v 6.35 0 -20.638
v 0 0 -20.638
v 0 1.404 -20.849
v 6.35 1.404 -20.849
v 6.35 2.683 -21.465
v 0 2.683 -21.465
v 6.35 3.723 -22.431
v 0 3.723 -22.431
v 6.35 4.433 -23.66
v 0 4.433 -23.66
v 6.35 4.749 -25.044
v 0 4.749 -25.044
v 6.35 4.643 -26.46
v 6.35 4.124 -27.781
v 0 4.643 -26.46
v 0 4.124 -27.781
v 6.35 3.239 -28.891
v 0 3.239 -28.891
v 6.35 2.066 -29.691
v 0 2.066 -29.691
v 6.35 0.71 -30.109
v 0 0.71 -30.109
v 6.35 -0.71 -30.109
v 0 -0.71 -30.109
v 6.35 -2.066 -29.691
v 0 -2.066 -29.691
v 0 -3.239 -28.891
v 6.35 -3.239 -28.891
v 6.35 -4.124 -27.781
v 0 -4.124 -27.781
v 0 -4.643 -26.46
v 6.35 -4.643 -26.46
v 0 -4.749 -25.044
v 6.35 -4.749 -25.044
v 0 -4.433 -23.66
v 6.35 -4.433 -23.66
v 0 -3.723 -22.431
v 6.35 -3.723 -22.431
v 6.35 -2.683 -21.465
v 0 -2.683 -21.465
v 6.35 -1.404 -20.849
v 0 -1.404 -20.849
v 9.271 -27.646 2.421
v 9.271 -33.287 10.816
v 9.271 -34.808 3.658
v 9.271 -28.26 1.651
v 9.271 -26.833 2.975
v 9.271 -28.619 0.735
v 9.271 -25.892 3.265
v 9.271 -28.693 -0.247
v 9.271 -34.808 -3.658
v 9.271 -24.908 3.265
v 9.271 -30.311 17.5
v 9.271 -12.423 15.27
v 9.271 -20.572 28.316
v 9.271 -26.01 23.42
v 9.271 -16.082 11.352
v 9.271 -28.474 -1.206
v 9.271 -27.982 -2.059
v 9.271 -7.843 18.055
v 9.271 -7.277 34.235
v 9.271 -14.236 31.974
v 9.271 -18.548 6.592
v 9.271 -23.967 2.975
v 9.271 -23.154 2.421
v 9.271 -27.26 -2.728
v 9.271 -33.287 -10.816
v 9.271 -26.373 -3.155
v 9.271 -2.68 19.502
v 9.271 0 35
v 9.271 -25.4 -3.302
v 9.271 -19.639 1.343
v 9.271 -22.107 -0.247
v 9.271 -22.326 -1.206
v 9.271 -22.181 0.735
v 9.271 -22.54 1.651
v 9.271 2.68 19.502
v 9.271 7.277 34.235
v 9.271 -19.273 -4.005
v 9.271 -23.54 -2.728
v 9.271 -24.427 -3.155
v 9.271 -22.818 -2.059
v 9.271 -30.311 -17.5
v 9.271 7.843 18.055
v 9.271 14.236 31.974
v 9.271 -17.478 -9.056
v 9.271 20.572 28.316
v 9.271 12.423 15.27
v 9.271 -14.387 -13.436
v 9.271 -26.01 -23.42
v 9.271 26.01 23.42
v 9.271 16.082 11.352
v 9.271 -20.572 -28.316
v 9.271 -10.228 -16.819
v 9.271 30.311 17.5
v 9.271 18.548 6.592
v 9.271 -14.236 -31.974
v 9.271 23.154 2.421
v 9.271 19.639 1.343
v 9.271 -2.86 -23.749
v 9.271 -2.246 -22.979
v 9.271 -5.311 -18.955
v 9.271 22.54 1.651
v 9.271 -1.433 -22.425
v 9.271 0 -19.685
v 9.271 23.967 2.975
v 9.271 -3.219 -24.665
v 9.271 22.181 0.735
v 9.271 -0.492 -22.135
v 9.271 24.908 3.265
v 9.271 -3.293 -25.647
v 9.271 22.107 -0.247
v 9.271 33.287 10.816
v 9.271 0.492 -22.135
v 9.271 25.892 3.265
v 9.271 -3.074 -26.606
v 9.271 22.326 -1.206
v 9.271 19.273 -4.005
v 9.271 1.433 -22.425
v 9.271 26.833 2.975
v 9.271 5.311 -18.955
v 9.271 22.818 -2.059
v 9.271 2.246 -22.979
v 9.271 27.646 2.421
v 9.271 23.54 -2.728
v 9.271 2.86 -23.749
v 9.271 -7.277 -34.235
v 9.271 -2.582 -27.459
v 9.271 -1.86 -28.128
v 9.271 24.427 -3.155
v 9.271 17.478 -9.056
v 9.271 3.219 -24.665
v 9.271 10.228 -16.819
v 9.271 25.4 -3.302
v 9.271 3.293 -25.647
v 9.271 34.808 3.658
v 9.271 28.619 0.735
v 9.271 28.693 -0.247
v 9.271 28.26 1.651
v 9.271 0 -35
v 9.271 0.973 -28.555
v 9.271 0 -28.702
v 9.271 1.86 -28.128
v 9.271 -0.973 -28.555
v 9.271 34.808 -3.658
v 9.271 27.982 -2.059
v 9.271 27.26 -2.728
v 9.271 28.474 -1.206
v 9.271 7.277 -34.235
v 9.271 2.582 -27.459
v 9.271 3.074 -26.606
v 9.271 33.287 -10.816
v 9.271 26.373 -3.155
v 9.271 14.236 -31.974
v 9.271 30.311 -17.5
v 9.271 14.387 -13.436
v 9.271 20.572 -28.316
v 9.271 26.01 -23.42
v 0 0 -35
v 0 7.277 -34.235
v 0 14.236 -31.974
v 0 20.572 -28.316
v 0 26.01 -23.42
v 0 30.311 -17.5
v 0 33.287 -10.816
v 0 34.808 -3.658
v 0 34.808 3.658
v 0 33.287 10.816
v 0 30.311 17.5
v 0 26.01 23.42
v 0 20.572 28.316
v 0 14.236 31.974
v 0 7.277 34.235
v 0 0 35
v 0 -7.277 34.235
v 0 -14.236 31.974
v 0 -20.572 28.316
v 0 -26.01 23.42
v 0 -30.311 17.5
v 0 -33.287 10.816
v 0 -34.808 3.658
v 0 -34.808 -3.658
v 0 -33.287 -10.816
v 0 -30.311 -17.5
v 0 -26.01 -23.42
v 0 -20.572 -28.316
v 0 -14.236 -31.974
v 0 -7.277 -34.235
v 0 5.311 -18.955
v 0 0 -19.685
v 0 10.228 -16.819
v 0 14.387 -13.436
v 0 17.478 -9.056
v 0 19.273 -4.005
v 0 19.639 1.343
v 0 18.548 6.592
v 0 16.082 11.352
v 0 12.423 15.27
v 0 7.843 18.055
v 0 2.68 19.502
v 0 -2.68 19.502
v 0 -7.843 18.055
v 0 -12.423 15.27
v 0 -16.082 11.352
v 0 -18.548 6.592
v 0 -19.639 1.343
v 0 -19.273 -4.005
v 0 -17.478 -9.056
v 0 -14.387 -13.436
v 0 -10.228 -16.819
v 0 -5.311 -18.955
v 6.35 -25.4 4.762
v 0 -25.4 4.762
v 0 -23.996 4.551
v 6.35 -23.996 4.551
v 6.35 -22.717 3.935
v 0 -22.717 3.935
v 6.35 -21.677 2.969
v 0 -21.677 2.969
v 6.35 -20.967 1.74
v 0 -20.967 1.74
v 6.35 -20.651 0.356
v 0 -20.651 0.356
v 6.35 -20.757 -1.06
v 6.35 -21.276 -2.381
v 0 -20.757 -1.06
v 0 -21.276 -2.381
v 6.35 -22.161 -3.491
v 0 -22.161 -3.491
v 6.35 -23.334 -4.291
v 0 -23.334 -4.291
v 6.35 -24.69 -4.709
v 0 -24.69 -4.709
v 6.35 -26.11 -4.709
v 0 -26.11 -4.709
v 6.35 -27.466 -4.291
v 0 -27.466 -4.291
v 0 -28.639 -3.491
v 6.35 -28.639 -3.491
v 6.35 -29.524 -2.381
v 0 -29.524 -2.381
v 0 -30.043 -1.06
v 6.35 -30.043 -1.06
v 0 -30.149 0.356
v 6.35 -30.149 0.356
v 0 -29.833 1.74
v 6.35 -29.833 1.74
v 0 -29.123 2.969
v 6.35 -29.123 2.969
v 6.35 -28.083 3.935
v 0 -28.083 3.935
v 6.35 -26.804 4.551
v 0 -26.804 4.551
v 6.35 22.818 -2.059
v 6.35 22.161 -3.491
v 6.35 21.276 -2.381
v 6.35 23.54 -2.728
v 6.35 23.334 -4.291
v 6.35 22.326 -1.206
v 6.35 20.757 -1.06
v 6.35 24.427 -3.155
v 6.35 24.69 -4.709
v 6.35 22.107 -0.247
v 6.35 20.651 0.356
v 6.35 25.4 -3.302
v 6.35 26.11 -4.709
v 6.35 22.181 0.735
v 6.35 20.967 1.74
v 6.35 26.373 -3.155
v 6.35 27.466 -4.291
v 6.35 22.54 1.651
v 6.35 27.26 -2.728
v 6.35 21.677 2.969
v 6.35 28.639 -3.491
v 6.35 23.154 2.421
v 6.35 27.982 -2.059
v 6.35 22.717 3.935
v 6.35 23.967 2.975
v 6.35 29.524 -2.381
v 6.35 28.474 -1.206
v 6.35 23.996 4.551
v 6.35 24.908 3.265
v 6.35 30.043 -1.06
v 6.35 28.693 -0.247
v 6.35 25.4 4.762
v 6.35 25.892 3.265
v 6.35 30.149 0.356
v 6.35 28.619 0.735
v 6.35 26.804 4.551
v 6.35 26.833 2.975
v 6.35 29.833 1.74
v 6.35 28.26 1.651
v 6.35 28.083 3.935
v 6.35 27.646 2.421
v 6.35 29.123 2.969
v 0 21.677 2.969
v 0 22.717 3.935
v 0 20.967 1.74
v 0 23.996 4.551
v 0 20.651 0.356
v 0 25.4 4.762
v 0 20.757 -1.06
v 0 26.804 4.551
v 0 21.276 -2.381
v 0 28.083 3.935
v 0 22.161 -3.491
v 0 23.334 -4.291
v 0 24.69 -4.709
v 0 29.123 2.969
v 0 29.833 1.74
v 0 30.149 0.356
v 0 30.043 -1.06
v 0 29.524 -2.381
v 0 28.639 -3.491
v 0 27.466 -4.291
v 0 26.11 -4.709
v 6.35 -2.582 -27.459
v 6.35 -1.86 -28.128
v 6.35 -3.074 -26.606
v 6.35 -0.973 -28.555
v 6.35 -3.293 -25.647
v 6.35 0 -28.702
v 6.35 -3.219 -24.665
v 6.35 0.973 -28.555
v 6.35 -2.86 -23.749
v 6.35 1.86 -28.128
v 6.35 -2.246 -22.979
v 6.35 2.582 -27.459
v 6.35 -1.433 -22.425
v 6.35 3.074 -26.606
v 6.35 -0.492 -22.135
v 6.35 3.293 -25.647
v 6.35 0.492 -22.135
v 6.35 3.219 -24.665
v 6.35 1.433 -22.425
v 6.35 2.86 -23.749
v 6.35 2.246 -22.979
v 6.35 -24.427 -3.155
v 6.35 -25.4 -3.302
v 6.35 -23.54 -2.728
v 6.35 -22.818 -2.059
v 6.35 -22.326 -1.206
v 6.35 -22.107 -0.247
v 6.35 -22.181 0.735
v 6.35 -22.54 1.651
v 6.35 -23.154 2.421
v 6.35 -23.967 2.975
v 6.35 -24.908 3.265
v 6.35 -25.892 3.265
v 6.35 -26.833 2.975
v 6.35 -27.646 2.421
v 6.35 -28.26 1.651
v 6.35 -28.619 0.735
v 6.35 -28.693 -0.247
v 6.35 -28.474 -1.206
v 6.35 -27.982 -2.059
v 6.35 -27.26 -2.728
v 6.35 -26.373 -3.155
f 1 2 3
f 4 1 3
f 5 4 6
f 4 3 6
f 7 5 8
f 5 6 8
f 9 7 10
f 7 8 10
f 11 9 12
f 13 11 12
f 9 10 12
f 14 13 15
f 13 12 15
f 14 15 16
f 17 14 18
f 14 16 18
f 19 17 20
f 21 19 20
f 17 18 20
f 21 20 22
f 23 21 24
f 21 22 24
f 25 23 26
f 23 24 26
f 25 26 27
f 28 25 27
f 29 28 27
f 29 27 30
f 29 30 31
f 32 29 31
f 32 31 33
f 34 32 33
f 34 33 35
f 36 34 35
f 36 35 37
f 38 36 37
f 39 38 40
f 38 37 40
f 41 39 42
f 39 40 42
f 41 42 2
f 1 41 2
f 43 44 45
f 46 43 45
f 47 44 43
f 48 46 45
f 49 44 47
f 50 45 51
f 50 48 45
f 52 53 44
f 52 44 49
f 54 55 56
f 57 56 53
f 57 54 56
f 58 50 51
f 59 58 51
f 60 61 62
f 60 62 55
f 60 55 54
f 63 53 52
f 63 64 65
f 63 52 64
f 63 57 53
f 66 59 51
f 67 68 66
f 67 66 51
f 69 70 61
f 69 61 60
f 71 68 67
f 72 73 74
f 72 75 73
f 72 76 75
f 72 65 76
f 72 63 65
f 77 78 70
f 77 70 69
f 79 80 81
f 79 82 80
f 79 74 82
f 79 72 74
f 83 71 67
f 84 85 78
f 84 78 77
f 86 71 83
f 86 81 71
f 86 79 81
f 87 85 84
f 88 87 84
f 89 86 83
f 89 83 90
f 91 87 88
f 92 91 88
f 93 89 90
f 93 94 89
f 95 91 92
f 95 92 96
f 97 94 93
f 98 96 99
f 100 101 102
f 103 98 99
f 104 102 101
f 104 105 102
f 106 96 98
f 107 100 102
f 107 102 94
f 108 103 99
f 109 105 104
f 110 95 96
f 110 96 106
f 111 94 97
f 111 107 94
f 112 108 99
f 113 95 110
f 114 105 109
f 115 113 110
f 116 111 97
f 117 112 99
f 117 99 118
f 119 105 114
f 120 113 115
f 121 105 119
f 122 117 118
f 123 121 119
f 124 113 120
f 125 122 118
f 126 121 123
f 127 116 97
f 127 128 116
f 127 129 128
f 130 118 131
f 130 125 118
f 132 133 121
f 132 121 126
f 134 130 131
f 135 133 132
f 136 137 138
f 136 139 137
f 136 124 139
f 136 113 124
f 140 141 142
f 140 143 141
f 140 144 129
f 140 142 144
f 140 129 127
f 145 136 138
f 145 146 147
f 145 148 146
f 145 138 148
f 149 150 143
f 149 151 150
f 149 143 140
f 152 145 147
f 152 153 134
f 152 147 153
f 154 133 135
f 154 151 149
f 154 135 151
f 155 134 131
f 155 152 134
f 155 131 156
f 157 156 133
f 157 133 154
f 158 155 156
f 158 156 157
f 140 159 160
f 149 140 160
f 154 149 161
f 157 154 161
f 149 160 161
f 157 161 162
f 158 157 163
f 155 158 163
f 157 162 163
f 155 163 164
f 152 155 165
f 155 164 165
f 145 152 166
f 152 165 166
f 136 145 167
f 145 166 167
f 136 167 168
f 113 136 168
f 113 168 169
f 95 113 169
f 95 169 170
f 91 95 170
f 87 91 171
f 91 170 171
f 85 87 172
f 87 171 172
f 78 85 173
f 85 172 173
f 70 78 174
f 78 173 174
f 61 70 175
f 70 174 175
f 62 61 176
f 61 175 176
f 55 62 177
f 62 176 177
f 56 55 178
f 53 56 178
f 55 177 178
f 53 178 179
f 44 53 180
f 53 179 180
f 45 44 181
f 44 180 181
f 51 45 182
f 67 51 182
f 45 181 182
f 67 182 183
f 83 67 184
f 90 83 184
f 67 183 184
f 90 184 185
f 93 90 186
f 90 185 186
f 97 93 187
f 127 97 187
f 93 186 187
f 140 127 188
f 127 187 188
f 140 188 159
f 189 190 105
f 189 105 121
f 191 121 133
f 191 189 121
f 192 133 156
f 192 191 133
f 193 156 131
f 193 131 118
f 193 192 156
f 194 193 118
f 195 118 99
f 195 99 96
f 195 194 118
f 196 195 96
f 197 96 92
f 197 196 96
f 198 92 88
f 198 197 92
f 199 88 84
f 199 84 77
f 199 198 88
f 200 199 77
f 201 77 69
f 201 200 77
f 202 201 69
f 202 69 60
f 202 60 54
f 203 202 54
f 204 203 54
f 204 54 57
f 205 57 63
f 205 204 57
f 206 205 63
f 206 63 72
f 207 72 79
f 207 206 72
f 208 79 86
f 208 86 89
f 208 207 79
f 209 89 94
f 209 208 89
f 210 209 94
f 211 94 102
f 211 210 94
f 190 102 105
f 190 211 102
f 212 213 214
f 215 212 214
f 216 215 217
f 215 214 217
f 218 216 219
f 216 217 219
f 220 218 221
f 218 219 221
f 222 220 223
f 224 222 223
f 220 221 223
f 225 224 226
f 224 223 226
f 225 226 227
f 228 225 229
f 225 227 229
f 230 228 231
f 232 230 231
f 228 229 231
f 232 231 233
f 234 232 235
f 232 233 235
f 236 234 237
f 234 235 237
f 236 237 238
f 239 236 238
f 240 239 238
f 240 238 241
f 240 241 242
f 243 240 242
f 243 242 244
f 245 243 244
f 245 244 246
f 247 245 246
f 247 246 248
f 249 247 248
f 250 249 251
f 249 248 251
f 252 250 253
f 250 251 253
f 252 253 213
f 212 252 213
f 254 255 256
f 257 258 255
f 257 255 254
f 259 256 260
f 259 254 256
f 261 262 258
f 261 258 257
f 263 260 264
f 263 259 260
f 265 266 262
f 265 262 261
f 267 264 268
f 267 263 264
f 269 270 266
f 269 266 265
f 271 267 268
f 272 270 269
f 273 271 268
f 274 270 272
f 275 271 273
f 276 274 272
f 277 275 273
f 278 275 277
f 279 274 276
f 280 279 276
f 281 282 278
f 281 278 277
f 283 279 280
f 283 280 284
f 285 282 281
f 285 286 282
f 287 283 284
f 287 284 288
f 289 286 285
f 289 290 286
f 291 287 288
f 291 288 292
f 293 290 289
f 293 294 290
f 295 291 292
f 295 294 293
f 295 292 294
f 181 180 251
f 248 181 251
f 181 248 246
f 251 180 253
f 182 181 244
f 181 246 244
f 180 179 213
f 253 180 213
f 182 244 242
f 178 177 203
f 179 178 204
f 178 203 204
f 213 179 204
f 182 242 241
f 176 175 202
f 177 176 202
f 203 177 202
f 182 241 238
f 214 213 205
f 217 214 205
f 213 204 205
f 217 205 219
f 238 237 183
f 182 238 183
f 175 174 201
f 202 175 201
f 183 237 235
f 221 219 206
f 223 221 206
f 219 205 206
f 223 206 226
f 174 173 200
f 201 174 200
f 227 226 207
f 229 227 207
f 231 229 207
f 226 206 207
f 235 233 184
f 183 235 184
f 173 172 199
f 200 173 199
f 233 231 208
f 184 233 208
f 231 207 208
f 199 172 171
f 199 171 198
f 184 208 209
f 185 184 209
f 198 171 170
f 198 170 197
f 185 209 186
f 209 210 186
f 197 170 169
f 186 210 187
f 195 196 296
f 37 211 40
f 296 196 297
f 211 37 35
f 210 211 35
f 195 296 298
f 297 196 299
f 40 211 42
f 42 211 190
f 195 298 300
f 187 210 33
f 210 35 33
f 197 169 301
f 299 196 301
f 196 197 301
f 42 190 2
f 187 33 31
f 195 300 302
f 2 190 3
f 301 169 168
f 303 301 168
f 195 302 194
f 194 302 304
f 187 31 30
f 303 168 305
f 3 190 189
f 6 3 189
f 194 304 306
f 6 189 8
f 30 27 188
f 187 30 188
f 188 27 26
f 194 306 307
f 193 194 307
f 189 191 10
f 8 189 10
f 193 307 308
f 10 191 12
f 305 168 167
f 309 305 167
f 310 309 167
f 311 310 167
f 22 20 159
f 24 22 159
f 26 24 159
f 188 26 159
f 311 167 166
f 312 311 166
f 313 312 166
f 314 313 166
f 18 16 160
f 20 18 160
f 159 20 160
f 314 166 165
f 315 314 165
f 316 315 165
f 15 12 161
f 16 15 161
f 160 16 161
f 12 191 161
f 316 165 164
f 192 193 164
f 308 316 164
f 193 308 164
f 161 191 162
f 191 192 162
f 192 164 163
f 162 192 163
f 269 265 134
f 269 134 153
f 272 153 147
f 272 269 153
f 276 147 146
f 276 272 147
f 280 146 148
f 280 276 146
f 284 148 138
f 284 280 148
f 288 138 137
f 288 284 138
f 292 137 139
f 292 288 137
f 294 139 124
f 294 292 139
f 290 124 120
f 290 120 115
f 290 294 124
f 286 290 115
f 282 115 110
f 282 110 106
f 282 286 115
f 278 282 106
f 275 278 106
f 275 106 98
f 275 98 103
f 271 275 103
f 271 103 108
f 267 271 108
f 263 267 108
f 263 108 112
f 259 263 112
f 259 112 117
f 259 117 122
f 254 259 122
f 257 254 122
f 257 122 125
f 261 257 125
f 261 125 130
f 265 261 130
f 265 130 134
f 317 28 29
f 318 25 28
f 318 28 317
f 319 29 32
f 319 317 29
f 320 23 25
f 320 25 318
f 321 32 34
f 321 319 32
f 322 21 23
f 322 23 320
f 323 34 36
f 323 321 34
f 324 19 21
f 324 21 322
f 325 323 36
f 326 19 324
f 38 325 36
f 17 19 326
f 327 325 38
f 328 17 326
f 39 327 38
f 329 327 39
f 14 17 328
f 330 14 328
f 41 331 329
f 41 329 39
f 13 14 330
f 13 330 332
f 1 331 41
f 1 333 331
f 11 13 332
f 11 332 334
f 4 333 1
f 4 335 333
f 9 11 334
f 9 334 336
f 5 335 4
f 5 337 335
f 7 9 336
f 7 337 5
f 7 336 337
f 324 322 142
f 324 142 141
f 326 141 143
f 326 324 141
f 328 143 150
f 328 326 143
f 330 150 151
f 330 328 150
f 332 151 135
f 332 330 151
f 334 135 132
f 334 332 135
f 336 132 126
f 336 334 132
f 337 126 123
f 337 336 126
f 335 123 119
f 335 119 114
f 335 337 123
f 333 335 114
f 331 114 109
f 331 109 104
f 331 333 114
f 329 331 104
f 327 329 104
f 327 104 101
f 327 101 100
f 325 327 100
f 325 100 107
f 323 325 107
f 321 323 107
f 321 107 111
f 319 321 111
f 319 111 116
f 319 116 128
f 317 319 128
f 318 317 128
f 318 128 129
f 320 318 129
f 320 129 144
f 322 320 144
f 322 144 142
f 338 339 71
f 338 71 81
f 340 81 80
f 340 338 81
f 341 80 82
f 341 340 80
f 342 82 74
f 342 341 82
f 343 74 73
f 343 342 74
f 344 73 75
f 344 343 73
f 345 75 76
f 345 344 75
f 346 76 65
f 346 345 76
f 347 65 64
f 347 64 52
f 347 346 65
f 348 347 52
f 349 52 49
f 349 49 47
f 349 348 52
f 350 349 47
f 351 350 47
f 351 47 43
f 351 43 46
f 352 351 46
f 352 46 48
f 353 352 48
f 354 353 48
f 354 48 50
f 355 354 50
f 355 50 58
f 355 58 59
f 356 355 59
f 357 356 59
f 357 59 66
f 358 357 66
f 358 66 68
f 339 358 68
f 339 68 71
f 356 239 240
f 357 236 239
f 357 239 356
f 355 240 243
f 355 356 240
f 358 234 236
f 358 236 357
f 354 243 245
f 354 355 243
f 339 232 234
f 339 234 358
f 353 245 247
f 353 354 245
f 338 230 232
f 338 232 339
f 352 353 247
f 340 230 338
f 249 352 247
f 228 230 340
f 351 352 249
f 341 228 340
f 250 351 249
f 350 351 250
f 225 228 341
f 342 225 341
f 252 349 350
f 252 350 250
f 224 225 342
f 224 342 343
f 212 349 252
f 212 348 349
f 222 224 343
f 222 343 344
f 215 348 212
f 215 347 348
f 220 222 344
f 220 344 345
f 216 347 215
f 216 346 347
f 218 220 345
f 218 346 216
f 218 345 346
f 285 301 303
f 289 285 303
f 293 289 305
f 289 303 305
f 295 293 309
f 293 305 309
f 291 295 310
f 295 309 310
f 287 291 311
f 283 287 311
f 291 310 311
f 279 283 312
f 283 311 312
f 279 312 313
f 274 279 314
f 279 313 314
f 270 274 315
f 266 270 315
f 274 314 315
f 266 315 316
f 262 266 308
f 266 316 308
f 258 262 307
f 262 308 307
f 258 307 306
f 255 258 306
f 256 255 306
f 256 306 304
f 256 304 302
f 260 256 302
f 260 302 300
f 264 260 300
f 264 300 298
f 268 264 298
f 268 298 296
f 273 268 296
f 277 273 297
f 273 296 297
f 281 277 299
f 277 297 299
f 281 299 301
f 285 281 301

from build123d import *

# Parameters (mm, degrees)
SKETCH1_R           = 35
SKETCH1_R_2         = 19.685
SKETCH1_R_3         = 3.302
BOSS_EXTRUDE1_DEPTH = 9.271
SKETCH2_R           = 4.7625
CUT_EXTRUDE1_DEPTH  = 6.35


with BuildPart() as part:
    # Sketch1 → Boss-Extrude1 (new body)
    with BuildSketch(Plane(origin=(0, 0, 0), x_dir=(0, 0, -1), z_dir=(1, 0, 0))):
        Circle(SKETCH1_R)
        Circle(SKETCH1_R_2, mode=Mode.SUBTRACT)
        with Locations((0, 25.4)):
            Circle(SKETCH1_R_3, mode=Mode.SUBTRACT)
        with Locations((25.4, 0)):
            Circle(SKETCH1_R_3, mode=Mode.SUBTRACT)
        with Locations((0, -25.4)):
            Circle(SKETCH1_R_3, mode=Mode.SUBTRACT)
    extrude(amount=BOSS_EXTRUDE1_DEPTH)

    # Sketch2 → Cut-Extrude1 (cut)
    with BuildSketch(Plane.ZY):
        with Locations((0, 25.4)):
            Circle(SKETCH2_R)
        with Locations((0, -25.4)):
            Circle(SKETCH2_R)
        with Locations((-25.4, 0)):
            Circle(SKETCH2_R)
    extrude(amount=-CUT_EXTRUDE1_DEPTH, mode=Mode.SUBTRACT)


solid = part.part
